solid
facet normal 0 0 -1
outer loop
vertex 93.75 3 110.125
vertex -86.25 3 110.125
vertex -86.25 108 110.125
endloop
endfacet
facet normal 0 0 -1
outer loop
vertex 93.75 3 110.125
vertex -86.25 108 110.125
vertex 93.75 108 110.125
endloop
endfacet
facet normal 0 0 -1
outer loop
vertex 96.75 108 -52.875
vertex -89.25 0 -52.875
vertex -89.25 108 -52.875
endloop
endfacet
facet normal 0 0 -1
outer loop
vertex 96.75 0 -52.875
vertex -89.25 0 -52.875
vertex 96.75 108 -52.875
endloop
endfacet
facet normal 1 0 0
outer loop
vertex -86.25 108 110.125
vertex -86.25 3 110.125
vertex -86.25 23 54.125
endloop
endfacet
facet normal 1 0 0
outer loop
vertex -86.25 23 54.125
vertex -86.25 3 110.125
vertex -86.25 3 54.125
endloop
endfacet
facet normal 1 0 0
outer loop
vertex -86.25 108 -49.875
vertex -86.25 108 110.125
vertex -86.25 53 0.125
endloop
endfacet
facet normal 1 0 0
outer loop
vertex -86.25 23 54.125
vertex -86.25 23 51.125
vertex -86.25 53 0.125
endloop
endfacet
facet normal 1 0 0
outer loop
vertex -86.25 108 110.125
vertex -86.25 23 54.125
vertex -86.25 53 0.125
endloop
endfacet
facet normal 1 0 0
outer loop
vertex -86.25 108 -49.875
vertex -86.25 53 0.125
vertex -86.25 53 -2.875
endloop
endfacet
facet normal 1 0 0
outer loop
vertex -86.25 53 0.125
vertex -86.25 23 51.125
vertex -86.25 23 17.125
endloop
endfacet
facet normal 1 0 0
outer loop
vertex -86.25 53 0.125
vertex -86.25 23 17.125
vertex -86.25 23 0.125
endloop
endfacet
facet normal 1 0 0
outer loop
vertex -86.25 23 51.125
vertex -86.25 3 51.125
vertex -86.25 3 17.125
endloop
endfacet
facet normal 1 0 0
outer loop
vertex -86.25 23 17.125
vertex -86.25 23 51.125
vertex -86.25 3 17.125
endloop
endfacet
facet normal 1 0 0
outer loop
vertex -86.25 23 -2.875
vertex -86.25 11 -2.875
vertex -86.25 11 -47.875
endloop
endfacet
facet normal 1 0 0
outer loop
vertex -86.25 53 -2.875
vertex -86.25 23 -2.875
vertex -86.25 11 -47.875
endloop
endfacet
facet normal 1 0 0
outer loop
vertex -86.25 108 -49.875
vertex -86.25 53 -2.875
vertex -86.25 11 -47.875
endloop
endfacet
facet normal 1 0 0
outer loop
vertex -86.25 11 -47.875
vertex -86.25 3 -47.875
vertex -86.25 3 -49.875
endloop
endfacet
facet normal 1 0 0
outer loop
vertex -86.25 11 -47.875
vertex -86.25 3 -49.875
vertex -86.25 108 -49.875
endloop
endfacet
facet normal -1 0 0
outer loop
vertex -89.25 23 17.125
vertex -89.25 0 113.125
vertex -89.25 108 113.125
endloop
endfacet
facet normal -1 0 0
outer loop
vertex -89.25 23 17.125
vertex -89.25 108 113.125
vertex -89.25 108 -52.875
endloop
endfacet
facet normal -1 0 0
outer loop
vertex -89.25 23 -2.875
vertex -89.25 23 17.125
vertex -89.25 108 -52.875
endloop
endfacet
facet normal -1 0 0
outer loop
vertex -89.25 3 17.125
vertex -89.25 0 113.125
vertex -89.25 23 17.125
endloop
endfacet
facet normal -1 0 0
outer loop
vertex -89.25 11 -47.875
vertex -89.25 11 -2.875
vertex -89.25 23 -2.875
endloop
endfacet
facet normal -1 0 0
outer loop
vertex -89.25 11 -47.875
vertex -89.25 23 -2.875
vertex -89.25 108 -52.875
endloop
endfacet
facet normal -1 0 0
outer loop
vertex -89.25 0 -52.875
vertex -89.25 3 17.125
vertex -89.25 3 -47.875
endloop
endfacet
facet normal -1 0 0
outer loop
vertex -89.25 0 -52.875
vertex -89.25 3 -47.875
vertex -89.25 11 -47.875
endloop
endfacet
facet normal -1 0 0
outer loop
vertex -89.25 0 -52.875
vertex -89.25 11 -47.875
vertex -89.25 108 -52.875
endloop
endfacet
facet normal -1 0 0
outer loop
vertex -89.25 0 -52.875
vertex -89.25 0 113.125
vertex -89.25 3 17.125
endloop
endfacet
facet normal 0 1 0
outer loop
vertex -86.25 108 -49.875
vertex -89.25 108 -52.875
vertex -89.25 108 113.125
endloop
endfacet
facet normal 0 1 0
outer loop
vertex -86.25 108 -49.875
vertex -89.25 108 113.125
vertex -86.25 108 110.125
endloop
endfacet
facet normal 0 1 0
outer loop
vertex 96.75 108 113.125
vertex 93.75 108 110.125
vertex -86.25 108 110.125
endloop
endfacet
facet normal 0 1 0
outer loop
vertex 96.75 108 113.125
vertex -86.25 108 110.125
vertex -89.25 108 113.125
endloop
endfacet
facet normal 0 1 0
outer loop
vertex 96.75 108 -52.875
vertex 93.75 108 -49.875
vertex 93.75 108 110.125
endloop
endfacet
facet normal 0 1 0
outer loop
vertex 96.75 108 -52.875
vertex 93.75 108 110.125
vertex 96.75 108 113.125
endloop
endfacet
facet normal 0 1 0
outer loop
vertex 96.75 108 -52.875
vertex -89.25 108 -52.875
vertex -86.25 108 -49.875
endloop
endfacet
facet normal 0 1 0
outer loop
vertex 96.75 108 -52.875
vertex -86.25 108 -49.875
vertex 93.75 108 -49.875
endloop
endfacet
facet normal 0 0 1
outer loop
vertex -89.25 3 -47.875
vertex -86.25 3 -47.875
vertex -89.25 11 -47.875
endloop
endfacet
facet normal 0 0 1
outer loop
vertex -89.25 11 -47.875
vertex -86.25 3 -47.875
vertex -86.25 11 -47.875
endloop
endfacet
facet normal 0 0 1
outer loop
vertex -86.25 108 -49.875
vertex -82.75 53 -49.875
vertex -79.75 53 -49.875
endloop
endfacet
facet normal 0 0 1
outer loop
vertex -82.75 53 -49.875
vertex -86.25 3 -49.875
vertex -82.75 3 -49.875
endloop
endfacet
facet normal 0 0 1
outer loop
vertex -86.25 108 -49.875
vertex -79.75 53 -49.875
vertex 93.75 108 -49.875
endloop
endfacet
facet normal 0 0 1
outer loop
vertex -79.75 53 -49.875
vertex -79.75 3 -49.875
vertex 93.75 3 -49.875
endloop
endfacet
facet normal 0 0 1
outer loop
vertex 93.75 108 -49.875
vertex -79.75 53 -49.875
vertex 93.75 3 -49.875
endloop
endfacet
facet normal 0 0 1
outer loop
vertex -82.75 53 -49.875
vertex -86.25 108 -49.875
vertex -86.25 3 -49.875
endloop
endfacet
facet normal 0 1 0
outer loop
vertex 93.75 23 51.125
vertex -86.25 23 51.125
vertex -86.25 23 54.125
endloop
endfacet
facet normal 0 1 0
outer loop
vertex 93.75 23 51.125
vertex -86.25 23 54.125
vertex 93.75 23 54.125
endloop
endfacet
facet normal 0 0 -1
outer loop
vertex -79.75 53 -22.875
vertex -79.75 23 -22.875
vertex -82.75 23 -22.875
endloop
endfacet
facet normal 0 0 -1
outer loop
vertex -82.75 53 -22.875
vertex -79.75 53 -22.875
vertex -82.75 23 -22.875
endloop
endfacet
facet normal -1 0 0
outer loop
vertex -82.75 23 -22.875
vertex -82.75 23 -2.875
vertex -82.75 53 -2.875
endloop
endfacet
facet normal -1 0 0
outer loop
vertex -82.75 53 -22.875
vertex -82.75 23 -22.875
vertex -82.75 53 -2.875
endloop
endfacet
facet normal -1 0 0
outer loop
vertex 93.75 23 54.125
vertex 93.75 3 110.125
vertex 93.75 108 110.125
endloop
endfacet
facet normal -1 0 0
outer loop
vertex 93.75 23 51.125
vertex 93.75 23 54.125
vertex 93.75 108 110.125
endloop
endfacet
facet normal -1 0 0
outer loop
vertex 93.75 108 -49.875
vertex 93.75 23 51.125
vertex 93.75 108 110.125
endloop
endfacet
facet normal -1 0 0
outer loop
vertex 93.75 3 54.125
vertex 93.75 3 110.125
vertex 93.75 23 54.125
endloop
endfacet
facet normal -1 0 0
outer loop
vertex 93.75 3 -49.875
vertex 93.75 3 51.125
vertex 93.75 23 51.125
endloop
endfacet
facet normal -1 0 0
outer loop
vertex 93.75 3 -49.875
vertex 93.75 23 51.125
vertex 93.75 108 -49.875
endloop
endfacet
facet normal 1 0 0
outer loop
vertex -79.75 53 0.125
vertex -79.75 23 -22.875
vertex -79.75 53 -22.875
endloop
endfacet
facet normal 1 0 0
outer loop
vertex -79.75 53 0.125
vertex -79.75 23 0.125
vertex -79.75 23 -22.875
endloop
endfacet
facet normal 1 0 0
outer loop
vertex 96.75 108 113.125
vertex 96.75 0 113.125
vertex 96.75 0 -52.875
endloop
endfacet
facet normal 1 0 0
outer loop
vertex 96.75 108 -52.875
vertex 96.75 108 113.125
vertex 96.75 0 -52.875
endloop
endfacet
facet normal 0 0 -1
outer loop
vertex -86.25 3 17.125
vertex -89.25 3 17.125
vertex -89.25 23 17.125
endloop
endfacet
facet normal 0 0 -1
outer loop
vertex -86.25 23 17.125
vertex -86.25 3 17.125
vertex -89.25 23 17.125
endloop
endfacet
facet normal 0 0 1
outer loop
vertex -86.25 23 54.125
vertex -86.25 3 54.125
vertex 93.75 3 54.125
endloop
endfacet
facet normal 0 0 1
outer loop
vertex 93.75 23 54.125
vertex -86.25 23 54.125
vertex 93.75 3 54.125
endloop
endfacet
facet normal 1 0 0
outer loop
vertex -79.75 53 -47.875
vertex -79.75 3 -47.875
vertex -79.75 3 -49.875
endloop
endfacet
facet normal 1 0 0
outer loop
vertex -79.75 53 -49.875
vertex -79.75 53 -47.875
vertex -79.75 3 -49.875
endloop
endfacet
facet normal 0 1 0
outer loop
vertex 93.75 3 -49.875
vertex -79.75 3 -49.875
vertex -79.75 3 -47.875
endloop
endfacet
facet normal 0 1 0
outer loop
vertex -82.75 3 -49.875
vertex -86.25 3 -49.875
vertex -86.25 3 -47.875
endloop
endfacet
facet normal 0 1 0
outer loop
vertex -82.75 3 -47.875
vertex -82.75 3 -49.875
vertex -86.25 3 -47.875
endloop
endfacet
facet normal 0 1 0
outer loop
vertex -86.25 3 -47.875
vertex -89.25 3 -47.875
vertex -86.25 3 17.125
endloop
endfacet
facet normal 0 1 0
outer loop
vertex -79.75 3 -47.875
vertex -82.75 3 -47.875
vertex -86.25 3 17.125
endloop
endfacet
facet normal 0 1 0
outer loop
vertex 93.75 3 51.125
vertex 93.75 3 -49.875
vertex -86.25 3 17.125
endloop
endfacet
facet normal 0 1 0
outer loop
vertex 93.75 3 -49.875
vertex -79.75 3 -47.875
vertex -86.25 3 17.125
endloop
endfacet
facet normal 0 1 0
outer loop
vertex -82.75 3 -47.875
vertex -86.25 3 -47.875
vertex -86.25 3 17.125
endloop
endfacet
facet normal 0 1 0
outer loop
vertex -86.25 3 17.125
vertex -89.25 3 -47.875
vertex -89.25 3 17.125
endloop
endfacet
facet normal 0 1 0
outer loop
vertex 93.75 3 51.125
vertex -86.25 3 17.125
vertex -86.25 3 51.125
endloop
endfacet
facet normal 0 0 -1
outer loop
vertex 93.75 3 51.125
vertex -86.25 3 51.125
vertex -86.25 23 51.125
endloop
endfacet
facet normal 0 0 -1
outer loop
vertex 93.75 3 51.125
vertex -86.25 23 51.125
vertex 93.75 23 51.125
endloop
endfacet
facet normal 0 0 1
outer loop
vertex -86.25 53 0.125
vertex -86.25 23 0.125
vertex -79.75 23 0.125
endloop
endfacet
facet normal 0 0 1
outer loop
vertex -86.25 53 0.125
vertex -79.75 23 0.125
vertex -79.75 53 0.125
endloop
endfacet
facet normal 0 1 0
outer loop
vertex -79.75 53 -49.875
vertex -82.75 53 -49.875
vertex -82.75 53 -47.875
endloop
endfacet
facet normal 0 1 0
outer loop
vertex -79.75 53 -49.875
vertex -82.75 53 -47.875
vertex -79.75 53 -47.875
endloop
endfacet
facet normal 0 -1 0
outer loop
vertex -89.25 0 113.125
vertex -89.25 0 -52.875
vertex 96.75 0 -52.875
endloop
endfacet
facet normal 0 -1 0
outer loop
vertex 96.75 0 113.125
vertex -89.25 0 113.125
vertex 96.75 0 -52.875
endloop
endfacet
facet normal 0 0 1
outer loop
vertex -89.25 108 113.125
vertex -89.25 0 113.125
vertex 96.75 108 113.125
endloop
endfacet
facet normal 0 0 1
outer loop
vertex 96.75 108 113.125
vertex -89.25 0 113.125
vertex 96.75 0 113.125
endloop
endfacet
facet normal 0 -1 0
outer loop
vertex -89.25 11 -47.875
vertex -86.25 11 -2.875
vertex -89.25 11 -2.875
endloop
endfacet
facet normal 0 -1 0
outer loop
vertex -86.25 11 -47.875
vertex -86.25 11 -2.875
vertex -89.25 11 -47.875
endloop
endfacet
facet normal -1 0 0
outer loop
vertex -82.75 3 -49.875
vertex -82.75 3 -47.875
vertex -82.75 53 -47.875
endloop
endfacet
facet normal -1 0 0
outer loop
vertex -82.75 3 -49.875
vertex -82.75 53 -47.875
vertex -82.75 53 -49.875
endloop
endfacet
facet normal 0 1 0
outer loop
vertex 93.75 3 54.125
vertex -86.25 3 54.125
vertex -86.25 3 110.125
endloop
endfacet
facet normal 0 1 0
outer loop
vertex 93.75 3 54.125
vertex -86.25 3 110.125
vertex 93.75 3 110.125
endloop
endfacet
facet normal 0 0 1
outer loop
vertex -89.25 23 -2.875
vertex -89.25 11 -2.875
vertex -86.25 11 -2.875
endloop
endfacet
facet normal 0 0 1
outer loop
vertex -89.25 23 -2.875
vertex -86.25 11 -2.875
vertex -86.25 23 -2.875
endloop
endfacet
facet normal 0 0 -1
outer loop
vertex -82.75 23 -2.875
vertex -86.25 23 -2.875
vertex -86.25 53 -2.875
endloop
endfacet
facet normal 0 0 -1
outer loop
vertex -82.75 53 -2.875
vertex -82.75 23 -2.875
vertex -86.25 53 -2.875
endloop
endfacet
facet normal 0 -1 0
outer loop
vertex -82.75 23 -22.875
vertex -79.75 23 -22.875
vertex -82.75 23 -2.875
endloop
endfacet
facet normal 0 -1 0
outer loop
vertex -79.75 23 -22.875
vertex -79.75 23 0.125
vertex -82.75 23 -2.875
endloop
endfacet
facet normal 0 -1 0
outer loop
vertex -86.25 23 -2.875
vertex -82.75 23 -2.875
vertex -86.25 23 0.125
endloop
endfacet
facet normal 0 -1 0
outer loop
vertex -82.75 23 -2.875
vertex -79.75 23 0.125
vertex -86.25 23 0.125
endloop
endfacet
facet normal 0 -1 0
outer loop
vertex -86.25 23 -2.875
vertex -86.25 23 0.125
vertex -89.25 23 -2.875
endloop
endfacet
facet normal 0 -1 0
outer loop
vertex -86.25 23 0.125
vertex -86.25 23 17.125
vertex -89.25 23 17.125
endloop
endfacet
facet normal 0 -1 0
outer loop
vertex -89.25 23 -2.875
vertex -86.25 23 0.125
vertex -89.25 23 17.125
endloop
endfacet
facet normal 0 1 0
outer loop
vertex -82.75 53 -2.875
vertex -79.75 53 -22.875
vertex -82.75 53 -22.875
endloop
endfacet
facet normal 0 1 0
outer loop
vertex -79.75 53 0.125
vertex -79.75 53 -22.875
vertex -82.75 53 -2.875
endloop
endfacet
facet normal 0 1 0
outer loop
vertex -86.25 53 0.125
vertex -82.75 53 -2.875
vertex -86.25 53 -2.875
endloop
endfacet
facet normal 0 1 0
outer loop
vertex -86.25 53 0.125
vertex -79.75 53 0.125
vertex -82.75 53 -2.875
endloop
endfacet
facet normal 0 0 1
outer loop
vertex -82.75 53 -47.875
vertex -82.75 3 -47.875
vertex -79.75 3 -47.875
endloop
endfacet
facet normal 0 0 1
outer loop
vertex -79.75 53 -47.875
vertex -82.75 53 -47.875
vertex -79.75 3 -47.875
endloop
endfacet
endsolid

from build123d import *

# Parameters (mm, degrees)
SKETCH1_W            = 186
SKETCH1_H            = 166
BOSS_EXTRUDE6_DEPTH  = 3
SKETCH9_W            = 183
SKETCH9_H            = 3
BOSS_EXTRUDE7_DEPTH  = 105
SKETCH8_W            = 3
SKETCH8_H            = 163
BOSS_EXTRUDE8_DEPTH  = 105
SKETCH7_W            = 186
SKETCH7_H            = 3
BOSS_EXTRUDE9_DEPTH  = 105
SKETCH11_W           = 3
SKETCH11_H           = 160
BOSS_EXTRUDE10_DEPTH = 105
SKETCH12_W           = 180
SKETCH12_H           = 3
BOSS_EXTRUDE11_DEPTH = 20
SKETCH13_W           = 45
SKETCH13_H           = 8
CUT_EXTRUDE5_DEPTH   = 3
SKETCH20_W           = 3
SKETCH20_H           = 2
BOSS_EXTRUDE12_DEPTH = 50
SKETCH18_W           = 20
SKETCH18_H           = 20
CUT_EXTRUDE6_DEPTH   = 3
SKETCH22_W           = 3
SKETCH22_H           = 30
BOSS_EXTRUDE13_DEPTH = 6.5
SKETCH23_W           = 3
SKETCH23_H           = 30
BOSS_EXTRUDE15_DEPTH = 20


with BuildPart() as part:
    # Sketch1 → Boss-Extrude6 (new body)
    with BuildSketch(Plane(origin=(0, 0, 0), x_dir=(1, 0, 0), z_dir=(0, 1, 0))):
        with Locations((3.75, -30.125)):
            Rectangle(SKETCH1_W, SKETCH1_H)
    extrude(amount=BOSS_EXTRUDE6_DEPTH)

    # Sketch9 → Boss-Extrude7 (add)
    with BuildSketch(Plane(origin=(0, 3, 0), x_dir=(1, 0, 0), z_dir=(0, 1, 0))):
        with Locations((2.25, -111.625)):
            Rectangle(SKETCH9_W, SKETCH9_H)
    extrude(amount=BOSS_EXTRUDE7_DEPTH)

    # Sketch8 → Boss-Extrude8 (add)
    with BuildSketch(Plane(origin=(0, 3, 0), x_dir=(1, 0, 0), z_dir=(0, 1, 0))):
        with Locations((95.25, -31.625)):
            Rectangle(SKETCH8_W, SKETCH8_H)
    extrude(amount=BOSS_EXTRUDE8_DEPTH)

    # Sketch7 → Boss-Extrude9 (add)
    with BuildSketch(Plane(origin=(0, 3, 0), x_dir=(1, 0, 0), z_dir=(0, 1, 0))):
        with Locations((3.75, 51.375)):
            Rectangle(SKETCH7_W, SKETCH7_H)
    extrude(amount=BOSS_EXTRUDE9_DEPTH)

    # Sketch11 → Boss-Extrude10 (add)
    with BuildSketch(Plane(origin=(0, 3, 0), x_dir=(1, 0, 0), z_dir=(0, 1, 0))):
        with Locations((-87.75, -30.125)):
            Rectangle(SKETCH11_W, SKETCH11_H)
    extrude(amount=BOSS_EXTRUDE10_DEPTH)

    # Sketch12 → Boss-Extrude11 (add)
    with BuildSketch(Plane(origin=(0, 3, 0), x_dir=(1, 0, 0), z_dir=(0, 1, 0))):
        with Locations((3.75, -52.625)):
            Rectangle(SKETCH12_W, SKETCH12_H)
    extrude(amount=BOSS_EXTRUDE11_DEPTH)

    # Sketch13 → Cut-Extrude5 (cut)
    with BuildSketch(Plane(origin=(-86.25, 0, 0), x_dir=(0, 0, -1), z_dir=(1, 0, 0))):
        with Locations((25.375, 7)):
            Rectangle(SKETCH13_W, SKETCH13_H)
    extrude(amount=-CUT_EXTRUDE5_DEPTH, mode=Mode.SUBTRACT)

    # Sketch20 → Boss-Extrude12 (add)
    with BuildSketch(Plane(origin=(0, 3, 0), x_dir=(1, 0, 0), z_dir=(0, 1, 0))):
        with Locations((-81.25, 48.875)):
            Rectangle(SKETCH20_W, SKETCH20_H)
    extrude(amount=BOSS_EXTRUDE12_DEPTH)

    # Sketch18 → Cut-Extrude6 (cut)
    with BuildSketch(Plane.ZY.offset(89.25)):
        with Locations((7.125, 13)):
            Rectangle(SKETCH18_W, SKETCH18_H)
    extrude(amount=-CUT_EXTRUDE6_DEPTH, mode=Mode.SUBTRACT)

    # Sketch22 → Boss-Extrude13 (add)
    with BuildSketch(Plane(origin=(-86.25, 0, 0), x_dir=(0, 0, -1), z_dir=(1, 0, 0))):
        with Locations((1.375, 38)):
            Rectangle(SKETCH22_W, SKETCH22_H)
    extrude(amount=BOSS_EXTRUDE13_DEPTH)

    # Sketch23 → Boss-Extrude15 (add)
    with BuildSketch(Plane(origin=(0, 0, -2.875), x_dir=(-1, 0, 0), z_dir=(0, 0, -1))):
        with Locations((81.25, 38)):
            Rectangle(SKETCH23_W, SKETCH23_H)
    extrude(amount=BOSS_EXTRUDE15_DEPTH)


solid = part.part
